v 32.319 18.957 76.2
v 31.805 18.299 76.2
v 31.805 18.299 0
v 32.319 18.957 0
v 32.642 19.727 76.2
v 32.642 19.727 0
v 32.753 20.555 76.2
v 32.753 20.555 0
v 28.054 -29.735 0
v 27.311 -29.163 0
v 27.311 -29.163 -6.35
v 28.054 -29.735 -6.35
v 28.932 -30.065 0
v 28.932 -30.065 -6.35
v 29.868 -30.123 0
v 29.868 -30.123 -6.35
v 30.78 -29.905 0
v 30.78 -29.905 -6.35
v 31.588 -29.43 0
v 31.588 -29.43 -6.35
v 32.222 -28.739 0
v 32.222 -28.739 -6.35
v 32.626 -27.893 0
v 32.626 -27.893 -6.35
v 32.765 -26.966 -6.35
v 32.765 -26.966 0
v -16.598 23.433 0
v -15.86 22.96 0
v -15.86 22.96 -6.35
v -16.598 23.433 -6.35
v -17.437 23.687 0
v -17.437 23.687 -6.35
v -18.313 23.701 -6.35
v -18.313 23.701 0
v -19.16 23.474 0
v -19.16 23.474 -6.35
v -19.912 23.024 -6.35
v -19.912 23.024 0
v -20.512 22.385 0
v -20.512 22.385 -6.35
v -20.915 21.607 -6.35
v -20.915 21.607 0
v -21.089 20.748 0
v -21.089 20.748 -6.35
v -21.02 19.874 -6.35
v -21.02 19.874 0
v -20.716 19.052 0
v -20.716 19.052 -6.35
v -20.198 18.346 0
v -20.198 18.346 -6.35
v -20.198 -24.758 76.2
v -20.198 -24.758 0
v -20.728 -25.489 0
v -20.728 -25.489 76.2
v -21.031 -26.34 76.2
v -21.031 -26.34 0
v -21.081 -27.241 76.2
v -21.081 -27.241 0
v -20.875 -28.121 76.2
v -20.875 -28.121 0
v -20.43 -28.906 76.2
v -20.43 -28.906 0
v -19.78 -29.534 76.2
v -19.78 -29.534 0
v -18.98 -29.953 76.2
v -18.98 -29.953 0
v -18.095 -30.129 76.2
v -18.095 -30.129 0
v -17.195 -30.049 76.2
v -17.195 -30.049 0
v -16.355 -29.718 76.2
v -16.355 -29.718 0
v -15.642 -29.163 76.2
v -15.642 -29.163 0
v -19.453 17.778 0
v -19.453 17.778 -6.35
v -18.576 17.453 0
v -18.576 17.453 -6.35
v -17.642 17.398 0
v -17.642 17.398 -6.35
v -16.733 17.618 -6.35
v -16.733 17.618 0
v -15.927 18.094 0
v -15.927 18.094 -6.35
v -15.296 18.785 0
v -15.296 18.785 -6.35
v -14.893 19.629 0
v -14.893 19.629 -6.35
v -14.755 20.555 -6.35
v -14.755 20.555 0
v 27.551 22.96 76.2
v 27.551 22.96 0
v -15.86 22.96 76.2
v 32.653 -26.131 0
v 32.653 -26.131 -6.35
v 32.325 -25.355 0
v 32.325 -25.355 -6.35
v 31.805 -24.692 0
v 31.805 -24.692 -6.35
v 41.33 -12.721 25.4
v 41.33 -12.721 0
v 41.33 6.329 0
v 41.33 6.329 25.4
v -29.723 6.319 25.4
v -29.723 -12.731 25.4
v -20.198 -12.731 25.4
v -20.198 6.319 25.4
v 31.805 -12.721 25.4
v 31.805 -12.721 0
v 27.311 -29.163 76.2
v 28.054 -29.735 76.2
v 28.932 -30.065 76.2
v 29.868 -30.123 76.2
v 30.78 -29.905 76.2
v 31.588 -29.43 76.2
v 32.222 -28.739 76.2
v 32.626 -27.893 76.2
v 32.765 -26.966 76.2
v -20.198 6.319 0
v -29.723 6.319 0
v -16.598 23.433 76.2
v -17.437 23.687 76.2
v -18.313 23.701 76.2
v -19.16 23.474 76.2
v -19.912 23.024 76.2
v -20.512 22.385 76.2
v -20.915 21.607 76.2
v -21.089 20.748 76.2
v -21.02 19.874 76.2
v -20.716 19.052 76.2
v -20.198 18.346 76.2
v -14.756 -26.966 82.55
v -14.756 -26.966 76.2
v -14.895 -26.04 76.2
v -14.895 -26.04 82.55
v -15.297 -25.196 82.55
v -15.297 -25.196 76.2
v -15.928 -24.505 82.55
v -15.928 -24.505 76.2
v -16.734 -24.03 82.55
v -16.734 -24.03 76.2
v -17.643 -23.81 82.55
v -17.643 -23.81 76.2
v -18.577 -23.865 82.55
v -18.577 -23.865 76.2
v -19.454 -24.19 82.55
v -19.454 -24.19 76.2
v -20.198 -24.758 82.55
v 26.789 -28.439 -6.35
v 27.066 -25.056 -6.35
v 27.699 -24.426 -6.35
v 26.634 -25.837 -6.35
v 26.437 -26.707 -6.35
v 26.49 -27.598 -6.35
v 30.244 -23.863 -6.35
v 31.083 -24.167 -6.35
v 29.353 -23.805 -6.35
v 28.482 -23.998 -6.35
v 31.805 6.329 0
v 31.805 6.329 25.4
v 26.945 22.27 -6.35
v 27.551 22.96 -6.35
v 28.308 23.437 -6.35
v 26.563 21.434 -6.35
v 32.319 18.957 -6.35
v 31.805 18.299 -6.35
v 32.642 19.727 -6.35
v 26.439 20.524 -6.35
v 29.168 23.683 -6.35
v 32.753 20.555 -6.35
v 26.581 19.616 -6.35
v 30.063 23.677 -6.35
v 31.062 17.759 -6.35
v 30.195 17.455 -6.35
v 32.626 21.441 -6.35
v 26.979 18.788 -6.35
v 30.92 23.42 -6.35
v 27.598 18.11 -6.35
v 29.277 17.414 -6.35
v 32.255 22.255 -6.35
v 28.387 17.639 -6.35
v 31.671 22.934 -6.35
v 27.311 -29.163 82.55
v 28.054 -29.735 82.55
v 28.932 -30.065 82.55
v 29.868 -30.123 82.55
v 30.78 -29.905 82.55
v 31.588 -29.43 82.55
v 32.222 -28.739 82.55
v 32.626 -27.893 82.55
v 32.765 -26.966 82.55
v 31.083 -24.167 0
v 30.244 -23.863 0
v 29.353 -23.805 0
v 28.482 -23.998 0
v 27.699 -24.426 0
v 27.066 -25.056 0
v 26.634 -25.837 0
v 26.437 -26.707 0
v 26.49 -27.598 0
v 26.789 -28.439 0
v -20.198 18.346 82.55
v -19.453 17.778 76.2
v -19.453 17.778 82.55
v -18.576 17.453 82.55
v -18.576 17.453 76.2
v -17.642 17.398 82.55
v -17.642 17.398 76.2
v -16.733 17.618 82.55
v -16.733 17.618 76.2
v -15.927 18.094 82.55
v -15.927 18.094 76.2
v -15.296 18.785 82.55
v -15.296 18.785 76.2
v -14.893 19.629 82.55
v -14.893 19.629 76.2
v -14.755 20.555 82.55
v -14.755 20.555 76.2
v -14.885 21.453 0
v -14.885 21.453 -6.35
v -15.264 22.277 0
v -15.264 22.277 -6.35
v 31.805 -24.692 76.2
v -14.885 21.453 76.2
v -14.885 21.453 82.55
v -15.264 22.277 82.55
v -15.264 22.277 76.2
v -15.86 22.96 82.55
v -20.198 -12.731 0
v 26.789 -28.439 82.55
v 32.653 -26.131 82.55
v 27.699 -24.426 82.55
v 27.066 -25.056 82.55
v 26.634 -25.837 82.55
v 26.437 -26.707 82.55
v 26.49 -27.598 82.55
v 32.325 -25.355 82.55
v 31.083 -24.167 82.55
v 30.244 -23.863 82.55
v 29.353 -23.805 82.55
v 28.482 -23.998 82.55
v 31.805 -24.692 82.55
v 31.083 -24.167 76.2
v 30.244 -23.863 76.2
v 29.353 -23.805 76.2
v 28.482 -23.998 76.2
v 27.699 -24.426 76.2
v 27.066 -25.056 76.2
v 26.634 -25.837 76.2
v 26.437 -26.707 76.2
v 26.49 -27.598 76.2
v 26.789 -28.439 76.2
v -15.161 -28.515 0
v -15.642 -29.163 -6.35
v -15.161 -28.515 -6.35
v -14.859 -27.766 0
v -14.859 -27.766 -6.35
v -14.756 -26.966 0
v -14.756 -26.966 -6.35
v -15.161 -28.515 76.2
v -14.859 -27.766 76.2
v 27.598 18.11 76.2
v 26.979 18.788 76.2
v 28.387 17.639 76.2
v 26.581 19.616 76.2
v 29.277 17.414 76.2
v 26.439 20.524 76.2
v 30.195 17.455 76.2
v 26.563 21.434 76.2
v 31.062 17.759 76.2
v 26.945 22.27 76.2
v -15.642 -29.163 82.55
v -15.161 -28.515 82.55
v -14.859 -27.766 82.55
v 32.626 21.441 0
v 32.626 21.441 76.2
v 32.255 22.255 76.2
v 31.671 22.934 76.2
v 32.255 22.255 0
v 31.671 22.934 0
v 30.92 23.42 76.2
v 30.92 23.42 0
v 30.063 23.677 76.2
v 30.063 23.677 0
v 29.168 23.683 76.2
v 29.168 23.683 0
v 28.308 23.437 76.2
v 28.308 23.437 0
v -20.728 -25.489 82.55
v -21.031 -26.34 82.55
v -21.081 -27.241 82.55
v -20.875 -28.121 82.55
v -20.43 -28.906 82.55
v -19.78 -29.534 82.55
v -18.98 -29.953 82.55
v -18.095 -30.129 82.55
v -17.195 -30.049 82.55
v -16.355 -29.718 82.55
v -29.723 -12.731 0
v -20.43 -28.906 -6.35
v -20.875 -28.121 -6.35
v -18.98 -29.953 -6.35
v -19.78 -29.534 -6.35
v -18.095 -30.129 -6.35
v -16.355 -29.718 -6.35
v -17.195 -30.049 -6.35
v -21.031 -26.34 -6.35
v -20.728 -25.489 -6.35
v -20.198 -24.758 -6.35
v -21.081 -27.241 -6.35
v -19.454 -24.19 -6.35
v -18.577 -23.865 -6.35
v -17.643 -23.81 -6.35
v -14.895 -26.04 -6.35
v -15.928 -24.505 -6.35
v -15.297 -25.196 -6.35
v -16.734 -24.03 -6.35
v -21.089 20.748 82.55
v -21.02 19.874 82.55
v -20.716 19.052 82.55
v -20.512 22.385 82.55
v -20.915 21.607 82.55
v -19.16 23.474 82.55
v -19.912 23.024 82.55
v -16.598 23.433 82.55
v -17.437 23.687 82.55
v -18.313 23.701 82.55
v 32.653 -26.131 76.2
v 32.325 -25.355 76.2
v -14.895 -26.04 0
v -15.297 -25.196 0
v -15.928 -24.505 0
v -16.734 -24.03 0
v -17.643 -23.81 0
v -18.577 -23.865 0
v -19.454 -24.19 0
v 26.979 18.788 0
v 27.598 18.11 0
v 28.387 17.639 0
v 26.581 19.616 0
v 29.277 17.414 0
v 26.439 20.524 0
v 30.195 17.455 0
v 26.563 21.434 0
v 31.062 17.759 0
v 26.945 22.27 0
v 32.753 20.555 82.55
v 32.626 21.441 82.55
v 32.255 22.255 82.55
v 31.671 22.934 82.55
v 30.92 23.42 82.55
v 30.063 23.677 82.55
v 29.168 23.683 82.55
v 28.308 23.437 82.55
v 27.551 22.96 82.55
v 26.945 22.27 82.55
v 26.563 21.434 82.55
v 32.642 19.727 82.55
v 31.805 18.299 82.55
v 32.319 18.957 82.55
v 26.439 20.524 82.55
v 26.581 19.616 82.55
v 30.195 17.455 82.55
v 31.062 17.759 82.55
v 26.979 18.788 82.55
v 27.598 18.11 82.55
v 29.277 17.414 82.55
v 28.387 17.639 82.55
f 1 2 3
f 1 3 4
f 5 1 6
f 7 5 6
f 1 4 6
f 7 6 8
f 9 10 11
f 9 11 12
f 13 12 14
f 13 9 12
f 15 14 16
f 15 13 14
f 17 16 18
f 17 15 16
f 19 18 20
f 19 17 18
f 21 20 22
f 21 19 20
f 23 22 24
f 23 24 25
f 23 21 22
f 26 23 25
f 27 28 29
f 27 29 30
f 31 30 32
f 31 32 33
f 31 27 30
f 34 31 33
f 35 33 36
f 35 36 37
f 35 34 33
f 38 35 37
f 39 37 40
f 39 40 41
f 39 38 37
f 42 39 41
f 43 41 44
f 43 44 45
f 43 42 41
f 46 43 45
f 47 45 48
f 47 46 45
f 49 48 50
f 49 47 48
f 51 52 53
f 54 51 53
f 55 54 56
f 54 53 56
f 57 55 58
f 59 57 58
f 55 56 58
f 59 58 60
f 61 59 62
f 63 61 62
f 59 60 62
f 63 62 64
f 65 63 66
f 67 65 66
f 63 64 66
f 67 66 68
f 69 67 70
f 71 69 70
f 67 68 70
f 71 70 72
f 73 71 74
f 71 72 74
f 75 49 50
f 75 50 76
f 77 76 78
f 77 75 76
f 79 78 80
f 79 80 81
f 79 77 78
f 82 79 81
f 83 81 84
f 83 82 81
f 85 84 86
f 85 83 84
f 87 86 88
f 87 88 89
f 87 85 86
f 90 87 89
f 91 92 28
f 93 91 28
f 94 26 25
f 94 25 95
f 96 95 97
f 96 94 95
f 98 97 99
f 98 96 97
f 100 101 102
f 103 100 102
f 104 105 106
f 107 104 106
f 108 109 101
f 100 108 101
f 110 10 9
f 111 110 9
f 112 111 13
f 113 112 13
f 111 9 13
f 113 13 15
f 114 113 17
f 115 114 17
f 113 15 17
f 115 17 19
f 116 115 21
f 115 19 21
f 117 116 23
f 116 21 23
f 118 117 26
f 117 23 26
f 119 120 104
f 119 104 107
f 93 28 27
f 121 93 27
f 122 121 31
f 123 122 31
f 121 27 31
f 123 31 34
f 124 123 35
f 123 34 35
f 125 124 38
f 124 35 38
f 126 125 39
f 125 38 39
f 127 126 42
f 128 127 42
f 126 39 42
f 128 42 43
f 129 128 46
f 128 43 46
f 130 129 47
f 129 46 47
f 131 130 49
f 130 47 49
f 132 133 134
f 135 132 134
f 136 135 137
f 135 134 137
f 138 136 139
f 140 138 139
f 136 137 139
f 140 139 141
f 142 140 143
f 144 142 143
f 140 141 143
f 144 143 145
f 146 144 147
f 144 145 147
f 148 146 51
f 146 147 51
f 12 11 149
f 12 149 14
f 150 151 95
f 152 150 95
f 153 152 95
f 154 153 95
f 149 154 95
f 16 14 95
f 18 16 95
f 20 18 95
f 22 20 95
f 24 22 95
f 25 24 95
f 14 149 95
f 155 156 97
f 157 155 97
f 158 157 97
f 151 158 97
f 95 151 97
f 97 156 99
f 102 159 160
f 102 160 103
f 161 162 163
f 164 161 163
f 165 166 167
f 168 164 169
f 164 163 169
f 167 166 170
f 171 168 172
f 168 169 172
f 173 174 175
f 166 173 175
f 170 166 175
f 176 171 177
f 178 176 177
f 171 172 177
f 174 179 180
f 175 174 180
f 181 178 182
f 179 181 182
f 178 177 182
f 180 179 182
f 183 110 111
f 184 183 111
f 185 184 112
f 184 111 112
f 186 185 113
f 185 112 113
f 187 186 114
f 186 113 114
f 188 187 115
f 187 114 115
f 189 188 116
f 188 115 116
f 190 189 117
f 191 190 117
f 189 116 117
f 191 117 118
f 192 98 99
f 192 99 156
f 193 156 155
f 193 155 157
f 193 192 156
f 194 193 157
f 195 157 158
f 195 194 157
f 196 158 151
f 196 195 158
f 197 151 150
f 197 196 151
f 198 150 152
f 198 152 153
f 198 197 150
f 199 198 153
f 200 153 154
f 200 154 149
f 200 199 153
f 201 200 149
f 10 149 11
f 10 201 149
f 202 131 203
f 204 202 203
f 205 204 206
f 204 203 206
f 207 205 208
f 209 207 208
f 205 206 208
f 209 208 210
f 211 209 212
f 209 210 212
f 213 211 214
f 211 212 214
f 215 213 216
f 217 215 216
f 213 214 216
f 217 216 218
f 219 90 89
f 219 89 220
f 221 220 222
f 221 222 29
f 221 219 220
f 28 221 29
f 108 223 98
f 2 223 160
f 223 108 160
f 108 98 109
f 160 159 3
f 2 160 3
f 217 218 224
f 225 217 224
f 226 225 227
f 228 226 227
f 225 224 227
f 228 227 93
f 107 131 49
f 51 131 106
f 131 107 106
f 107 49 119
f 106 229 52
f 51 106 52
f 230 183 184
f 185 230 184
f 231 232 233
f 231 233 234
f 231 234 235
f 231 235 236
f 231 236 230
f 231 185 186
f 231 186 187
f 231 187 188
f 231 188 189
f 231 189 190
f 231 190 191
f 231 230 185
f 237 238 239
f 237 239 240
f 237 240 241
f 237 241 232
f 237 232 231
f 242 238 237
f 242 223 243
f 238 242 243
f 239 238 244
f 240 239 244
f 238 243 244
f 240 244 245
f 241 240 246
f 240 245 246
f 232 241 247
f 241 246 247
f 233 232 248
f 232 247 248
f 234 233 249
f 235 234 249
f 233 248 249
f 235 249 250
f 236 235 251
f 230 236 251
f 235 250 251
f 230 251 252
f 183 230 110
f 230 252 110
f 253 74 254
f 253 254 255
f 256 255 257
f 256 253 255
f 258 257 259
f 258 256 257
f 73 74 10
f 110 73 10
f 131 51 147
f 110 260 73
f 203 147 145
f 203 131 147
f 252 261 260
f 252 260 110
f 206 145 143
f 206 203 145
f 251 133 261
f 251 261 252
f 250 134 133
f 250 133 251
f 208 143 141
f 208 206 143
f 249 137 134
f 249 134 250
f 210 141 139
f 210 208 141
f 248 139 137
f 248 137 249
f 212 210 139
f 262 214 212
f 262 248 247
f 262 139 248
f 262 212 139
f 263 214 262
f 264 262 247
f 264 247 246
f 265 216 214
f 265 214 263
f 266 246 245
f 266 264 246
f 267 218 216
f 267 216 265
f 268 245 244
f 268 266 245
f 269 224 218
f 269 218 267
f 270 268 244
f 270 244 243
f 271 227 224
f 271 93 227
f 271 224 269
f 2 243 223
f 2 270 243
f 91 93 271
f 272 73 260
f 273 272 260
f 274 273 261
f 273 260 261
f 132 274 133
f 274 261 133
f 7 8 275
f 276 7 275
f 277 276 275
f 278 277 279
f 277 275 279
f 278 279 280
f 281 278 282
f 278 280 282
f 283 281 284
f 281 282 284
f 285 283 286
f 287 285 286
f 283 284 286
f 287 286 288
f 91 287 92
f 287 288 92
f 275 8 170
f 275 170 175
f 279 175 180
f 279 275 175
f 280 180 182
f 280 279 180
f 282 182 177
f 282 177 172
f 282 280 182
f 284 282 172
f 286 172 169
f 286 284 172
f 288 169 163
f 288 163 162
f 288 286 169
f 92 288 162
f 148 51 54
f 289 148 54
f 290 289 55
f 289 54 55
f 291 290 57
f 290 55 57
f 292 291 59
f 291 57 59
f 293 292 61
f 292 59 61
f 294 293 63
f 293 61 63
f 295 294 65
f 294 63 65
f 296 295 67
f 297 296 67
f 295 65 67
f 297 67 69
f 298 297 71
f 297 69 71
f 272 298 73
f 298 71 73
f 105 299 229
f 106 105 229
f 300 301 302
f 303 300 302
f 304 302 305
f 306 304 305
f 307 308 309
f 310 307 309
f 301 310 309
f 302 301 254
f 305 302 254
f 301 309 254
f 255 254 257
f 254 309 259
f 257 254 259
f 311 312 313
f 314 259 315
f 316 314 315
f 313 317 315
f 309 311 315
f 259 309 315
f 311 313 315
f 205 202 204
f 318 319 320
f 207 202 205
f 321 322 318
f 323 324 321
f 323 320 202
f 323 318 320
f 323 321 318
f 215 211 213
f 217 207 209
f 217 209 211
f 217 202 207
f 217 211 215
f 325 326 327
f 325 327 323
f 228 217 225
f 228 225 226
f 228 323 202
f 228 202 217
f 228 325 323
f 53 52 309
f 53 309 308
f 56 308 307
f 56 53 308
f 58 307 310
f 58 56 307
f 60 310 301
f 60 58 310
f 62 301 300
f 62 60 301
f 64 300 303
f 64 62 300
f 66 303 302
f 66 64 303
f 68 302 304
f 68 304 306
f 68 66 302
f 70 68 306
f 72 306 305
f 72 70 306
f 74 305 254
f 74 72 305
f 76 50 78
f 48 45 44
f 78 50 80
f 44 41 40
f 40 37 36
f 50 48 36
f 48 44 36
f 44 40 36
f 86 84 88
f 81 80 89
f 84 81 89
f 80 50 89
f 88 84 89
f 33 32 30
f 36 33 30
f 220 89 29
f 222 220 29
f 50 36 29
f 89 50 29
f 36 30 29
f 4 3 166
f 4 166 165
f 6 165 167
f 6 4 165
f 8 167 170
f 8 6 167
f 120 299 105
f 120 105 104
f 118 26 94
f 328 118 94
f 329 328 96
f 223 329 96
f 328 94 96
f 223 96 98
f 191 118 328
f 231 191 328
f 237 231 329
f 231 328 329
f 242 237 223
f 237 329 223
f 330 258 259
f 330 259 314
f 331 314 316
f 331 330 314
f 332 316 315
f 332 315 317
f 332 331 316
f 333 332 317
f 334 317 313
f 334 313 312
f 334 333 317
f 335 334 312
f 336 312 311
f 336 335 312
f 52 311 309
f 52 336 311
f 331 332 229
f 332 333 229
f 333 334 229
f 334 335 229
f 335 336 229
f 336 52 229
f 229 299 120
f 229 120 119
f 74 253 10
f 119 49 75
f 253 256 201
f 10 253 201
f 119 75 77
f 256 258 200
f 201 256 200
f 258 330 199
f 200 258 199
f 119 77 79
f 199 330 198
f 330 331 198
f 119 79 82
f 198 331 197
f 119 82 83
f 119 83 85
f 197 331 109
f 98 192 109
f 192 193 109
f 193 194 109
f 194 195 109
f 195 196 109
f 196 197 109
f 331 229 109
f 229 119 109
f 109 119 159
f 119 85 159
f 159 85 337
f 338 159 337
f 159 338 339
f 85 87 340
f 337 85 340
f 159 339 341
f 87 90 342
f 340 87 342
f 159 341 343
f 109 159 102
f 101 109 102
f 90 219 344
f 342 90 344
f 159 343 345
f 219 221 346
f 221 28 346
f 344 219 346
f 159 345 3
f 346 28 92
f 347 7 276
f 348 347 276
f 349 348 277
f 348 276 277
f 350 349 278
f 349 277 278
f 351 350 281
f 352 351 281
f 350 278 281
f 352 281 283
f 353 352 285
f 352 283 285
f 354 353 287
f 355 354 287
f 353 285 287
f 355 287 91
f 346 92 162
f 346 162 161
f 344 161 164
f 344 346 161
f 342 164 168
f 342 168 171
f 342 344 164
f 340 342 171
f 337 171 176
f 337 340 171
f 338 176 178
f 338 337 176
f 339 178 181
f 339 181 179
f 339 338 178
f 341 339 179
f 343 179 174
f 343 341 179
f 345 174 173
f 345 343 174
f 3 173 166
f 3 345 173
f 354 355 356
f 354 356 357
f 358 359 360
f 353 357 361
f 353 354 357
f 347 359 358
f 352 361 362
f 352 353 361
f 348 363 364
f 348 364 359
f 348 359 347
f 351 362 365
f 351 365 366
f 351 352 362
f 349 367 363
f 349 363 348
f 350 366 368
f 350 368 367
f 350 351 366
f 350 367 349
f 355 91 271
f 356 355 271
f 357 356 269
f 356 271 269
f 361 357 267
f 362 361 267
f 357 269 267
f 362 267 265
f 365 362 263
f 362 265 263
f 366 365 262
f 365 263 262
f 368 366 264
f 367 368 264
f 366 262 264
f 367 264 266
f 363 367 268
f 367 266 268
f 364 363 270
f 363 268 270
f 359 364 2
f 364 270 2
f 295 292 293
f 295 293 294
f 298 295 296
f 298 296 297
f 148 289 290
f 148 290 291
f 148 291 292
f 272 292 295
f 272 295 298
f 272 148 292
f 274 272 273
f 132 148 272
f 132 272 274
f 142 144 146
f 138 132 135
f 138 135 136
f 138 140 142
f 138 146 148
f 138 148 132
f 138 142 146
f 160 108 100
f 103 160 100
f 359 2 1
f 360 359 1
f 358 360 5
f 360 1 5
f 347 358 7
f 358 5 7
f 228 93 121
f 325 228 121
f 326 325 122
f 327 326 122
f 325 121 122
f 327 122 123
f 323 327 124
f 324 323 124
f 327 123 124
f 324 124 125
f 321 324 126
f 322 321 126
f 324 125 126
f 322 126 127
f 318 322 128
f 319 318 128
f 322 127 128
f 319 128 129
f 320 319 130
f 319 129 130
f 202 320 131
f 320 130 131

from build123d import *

# Parameters (mm, degrees)
F1_DEPTH = 82.55
F2_DEPTH = 76.2
F0_W     = 9.525
F0_H     = 19.05
F3_DEPTH = 25.4


# Not quite as in the source:
# - a feature of the source that left no trace in its solid (it failed there, or was rolled back) is left out
# - a pattern or mirror of a feature is missing from the dataset's text; its kind, count and spacing are read off the source's solid


with BuildPart() as f1:
    # F0 (on Top) → F1 (new body)
    with BuildSketch(Plane.XY):
        with BuildLine():
            ThreePointArc((-20.197500676, 18.3455366127), (-16.7326156752, 17.6181000932), (-14.7552827986, 20.5548919915))
            ThreePointArc((-14.7552827986, 20.5548919915), (-15.044803813, 21.8783314962), (-15.8604748841, 22.9599946804))
            ThreePointArc((-15.8604748841, 22.9599946804), (-20.234431152, 22.7256124785), (-20.197500676, 18.3455366127))
        make_face()
    extrude(amount=F1_DEPTH)

    # F1_copies: F1 across plane


with BuildPart() as f1b:
    # F0 (on Top) → F1, piece 2 (new body)
    with BuildSketch(Plane.XY):
        with BuildLine():
            ThreePointArc((32.7525223778, 20.5548919915), (30.9204110591, 23.4204148874), (27.5505643884, 22.9599946804))
            ThreePointArc((27.5505643884, 22.9599946804), (27.2638489298, 18.4265931888), (31.8045291463, 18.2994790273))
            ThreePointArc((31.8045291463, 18.2994790273), (32.5058902534, 19.3316198625), (32.7525223778, 20.5548919915))
        make_face()
    extrude(amount=F1_DEPTH)

    # F1_2_copies: F1b across plane


with BuildPart() as f1c:
    # F0 (on Top) → F1, piece 3 (new body)
    with BuildSketch(Plane.XY):
        with BuildLine():
            ThreePointArc((32.7651335661, -26.9655103104), (32.5151222308, -25.7316713922), (31.8045291463, -24.6924786227))
            ThreePointArc((31.8045291463, -24.6924786227), (27.3600452383, -24.7185591863), (27.3112643614, -29.1628519118))
            ThreePointArc((27.3112643614, -29.1628519118), (30.7800389767, -29.9054507611), (32.7651335661, -26.9655103104))
        make_face()
    extrude(amount=F1_DEPTH)

    # F1_3_copies: F1c across plane


with BuildPart() as f1d:
    # F0 (on Top) → F1, piece 4 (new body)
    with BuildSketch(Plane.XY):
        with BuildLine():
            ThreePointArc((-14.7564191649, -26.9655103104), (-16.7335847801, -24.0295514846), (-20.197500676, -24.7577854871))
            ThreePointArc((-20.197500676, -24.7577854871), (-20.1273922452, -29.2431839447), (-15.6421652409, -29.1628519118))
            ThreePointArc((-15.6421652409, -29.1628519118), (-14.9861867967, -28.150083675), (-14.7564191649, -26.9655103104))
        make_face()
    extrude(amount=F1_DEPTH)

    # F1_4_copies: F1d across plane


with BuildPart() as f1_1:
    add(f1.part)
    add(f1.part.mirror(Plane(origin=(0, 0, 38.1), x_dir=(-1, 0, 0), z_dir=(0, 0, -1))))



with BuildPart() as f1b_1:
    add(f1b.part)
    add(f1b.part.mirror(Plane(origin=(0, 0, 38.1), x_dir=(-1, 0, 0), z_dir=(0, 0, -1))))


with BuildPart() as f1c_1:
    add(f1c.part)
    add(f1c.part.mirror(Plane(origin=(0, 0, 38.1), x_dir=(-1, 0, 0), z_dir=(0, 0, -1))))


with BuildPart() as f1d_1:
    add(f1d.part)
    add(f1d.part.mirror(Plane(origin=(0, 0, 38.1), x_dir=(-1, 0, 0), z_dir=(0, 0, -1))))


with BuildPart() as f1_2:
    add(f1_1.part)

    add(f1b_1.part)  # F2 merges F1b

    add(f1c_1.part)  # F2 merges F1c

    add(f1d_1.part)  # F2 merges F1d
    # F0 (on Top) → F2 (join)
    with BuildSketch(Plane.XY):
        with BuildLine():
            ThreePointArc((-15.8604748841, 22.9599946804), (-15.044803813, 21.8783314962), (-14.7552827986, 20.5548919915))
            ThreePointArc((-14.7552827986, 20.5548919915), (-16.7326156752, 17.6181000932), (-20.197500676, 18.3455366127))
            Line((-20.197500676, 18.3455366127), (-20.197500676, 6.3188755628))
            Line((-20.197500676, 6.3188755628), (-20.197500676, -12.7311244372))
            Line((-20.197500676, -12.7311244372), (-20.197500676, -24.7577854871))
            ThreePointArc((-20.197500676, -24.7577854871), (-16.7335847801, -24.0295514846), (-14.7564191649, -26.9655103104))
            ThreePointArc((-14.7564191649, -26.9655103104), (-14.9861867967, -28.150083675), (-15.6421652409, -29.1628519118))
            Line((-15.6421652409, -29.1628519118), (27.3112643614, -29.1628519118))
            ThreePointArc((27.3112643614, -29.1628519118), (27.3600452383, -24.7185591863), (31.8045291463, -24.6924786227))
            Line((31.8045291463, -24.6924786227), (31.8045291463, -12.7214997977))
            Line((31.8045291463, -12.7214997977), (31.8045291463, 6.3285002023))
            Line((31.8045291463, 6.3285002023), (31.8045291463, 18.2994790273))
            ThreePointArc((31.8045291463, 18.2994790273), (27.2638489298, 18.4265931888), (27.5505643884, 22.9599946804))
            Line((27.5505643884, 22.9599946804), (-15.8604748841, 22.9599946804))
        make_face()
    extrude(amount=F2_DEPTH)

    # F0 (on Top) → F3 (join)
    with BuildSketch(Plane.XY):
        with Locations((-24.960000676, -3.2061244372)):
            Rectangle(F0_W, F0_H)
        with Locations((36.5670291463, -3.1964997977)):
            Rectangle(F0_W, F0_H)
    extrude(amount=F3_DEPTH)


solid = f1_2.part
